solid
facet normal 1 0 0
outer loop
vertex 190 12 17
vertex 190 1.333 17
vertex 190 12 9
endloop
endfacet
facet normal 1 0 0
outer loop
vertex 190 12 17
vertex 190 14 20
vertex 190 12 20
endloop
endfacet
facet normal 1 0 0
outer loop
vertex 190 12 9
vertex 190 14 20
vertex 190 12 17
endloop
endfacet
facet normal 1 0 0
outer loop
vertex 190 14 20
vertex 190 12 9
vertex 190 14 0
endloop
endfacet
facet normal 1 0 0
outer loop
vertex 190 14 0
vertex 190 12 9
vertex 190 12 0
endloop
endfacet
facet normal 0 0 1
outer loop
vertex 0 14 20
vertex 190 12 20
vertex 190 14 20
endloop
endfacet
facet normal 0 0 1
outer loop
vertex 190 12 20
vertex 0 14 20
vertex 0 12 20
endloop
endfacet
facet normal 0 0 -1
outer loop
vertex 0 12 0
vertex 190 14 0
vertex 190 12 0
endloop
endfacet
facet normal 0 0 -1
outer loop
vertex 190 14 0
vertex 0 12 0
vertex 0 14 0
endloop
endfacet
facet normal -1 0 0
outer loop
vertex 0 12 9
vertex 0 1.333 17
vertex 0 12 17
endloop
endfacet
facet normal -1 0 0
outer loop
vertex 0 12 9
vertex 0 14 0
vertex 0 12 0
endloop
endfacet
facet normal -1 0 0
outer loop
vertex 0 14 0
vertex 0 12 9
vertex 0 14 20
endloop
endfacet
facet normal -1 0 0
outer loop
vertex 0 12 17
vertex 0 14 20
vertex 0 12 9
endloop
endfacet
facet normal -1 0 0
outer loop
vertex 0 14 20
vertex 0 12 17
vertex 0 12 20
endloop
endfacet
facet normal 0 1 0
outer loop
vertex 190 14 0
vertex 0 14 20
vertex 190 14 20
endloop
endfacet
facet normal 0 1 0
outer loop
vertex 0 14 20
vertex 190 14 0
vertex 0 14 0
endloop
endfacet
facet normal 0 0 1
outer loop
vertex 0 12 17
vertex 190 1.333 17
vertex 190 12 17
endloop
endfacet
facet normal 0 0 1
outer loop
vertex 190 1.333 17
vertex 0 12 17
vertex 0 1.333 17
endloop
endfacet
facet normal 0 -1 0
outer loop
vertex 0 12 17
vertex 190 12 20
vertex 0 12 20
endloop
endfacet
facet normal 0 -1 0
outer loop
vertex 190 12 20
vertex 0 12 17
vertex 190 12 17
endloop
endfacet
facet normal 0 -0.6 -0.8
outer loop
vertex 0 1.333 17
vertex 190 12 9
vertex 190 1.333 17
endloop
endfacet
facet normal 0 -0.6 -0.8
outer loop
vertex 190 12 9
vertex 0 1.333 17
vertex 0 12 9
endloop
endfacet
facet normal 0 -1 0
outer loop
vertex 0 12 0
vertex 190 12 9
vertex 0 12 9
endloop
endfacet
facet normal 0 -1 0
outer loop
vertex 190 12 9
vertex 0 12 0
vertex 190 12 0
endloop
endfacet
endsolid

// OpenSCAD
// file: import/smow_lib.scad
module triangle(x, y, z) {
    polyhedron(
        points=[[0,0,0],[x,0,0],[x,y,0],[0,y,0],[0,y,z],[x,y,z]],
        faces=[[0,1,2,3],[5,4,3,2],[0,4,5,1],[0,3,4],[5,2,1]]
    );
}

module mirror_copy(v) {
	children();
	mirror(v) children();
}
// main file
include <import/smow_lib.scad>

height = 20;
width = 190;
depth = 14;

cut_depth = 12;
cut_height = 3;
trim_depth = depth-2;
support_size = 9;

difference() {
	cube([width, depth, height]);
	translate([0, 0, height-cut_height]) cube([width, cut_depth, cut_height]);
	rotate([0, 0, 180]) translate([-width, -trim_depth, support_size]) triangle(width, trim_depth, support_size);
	cube([width, cut_depth, support_size]);
}
